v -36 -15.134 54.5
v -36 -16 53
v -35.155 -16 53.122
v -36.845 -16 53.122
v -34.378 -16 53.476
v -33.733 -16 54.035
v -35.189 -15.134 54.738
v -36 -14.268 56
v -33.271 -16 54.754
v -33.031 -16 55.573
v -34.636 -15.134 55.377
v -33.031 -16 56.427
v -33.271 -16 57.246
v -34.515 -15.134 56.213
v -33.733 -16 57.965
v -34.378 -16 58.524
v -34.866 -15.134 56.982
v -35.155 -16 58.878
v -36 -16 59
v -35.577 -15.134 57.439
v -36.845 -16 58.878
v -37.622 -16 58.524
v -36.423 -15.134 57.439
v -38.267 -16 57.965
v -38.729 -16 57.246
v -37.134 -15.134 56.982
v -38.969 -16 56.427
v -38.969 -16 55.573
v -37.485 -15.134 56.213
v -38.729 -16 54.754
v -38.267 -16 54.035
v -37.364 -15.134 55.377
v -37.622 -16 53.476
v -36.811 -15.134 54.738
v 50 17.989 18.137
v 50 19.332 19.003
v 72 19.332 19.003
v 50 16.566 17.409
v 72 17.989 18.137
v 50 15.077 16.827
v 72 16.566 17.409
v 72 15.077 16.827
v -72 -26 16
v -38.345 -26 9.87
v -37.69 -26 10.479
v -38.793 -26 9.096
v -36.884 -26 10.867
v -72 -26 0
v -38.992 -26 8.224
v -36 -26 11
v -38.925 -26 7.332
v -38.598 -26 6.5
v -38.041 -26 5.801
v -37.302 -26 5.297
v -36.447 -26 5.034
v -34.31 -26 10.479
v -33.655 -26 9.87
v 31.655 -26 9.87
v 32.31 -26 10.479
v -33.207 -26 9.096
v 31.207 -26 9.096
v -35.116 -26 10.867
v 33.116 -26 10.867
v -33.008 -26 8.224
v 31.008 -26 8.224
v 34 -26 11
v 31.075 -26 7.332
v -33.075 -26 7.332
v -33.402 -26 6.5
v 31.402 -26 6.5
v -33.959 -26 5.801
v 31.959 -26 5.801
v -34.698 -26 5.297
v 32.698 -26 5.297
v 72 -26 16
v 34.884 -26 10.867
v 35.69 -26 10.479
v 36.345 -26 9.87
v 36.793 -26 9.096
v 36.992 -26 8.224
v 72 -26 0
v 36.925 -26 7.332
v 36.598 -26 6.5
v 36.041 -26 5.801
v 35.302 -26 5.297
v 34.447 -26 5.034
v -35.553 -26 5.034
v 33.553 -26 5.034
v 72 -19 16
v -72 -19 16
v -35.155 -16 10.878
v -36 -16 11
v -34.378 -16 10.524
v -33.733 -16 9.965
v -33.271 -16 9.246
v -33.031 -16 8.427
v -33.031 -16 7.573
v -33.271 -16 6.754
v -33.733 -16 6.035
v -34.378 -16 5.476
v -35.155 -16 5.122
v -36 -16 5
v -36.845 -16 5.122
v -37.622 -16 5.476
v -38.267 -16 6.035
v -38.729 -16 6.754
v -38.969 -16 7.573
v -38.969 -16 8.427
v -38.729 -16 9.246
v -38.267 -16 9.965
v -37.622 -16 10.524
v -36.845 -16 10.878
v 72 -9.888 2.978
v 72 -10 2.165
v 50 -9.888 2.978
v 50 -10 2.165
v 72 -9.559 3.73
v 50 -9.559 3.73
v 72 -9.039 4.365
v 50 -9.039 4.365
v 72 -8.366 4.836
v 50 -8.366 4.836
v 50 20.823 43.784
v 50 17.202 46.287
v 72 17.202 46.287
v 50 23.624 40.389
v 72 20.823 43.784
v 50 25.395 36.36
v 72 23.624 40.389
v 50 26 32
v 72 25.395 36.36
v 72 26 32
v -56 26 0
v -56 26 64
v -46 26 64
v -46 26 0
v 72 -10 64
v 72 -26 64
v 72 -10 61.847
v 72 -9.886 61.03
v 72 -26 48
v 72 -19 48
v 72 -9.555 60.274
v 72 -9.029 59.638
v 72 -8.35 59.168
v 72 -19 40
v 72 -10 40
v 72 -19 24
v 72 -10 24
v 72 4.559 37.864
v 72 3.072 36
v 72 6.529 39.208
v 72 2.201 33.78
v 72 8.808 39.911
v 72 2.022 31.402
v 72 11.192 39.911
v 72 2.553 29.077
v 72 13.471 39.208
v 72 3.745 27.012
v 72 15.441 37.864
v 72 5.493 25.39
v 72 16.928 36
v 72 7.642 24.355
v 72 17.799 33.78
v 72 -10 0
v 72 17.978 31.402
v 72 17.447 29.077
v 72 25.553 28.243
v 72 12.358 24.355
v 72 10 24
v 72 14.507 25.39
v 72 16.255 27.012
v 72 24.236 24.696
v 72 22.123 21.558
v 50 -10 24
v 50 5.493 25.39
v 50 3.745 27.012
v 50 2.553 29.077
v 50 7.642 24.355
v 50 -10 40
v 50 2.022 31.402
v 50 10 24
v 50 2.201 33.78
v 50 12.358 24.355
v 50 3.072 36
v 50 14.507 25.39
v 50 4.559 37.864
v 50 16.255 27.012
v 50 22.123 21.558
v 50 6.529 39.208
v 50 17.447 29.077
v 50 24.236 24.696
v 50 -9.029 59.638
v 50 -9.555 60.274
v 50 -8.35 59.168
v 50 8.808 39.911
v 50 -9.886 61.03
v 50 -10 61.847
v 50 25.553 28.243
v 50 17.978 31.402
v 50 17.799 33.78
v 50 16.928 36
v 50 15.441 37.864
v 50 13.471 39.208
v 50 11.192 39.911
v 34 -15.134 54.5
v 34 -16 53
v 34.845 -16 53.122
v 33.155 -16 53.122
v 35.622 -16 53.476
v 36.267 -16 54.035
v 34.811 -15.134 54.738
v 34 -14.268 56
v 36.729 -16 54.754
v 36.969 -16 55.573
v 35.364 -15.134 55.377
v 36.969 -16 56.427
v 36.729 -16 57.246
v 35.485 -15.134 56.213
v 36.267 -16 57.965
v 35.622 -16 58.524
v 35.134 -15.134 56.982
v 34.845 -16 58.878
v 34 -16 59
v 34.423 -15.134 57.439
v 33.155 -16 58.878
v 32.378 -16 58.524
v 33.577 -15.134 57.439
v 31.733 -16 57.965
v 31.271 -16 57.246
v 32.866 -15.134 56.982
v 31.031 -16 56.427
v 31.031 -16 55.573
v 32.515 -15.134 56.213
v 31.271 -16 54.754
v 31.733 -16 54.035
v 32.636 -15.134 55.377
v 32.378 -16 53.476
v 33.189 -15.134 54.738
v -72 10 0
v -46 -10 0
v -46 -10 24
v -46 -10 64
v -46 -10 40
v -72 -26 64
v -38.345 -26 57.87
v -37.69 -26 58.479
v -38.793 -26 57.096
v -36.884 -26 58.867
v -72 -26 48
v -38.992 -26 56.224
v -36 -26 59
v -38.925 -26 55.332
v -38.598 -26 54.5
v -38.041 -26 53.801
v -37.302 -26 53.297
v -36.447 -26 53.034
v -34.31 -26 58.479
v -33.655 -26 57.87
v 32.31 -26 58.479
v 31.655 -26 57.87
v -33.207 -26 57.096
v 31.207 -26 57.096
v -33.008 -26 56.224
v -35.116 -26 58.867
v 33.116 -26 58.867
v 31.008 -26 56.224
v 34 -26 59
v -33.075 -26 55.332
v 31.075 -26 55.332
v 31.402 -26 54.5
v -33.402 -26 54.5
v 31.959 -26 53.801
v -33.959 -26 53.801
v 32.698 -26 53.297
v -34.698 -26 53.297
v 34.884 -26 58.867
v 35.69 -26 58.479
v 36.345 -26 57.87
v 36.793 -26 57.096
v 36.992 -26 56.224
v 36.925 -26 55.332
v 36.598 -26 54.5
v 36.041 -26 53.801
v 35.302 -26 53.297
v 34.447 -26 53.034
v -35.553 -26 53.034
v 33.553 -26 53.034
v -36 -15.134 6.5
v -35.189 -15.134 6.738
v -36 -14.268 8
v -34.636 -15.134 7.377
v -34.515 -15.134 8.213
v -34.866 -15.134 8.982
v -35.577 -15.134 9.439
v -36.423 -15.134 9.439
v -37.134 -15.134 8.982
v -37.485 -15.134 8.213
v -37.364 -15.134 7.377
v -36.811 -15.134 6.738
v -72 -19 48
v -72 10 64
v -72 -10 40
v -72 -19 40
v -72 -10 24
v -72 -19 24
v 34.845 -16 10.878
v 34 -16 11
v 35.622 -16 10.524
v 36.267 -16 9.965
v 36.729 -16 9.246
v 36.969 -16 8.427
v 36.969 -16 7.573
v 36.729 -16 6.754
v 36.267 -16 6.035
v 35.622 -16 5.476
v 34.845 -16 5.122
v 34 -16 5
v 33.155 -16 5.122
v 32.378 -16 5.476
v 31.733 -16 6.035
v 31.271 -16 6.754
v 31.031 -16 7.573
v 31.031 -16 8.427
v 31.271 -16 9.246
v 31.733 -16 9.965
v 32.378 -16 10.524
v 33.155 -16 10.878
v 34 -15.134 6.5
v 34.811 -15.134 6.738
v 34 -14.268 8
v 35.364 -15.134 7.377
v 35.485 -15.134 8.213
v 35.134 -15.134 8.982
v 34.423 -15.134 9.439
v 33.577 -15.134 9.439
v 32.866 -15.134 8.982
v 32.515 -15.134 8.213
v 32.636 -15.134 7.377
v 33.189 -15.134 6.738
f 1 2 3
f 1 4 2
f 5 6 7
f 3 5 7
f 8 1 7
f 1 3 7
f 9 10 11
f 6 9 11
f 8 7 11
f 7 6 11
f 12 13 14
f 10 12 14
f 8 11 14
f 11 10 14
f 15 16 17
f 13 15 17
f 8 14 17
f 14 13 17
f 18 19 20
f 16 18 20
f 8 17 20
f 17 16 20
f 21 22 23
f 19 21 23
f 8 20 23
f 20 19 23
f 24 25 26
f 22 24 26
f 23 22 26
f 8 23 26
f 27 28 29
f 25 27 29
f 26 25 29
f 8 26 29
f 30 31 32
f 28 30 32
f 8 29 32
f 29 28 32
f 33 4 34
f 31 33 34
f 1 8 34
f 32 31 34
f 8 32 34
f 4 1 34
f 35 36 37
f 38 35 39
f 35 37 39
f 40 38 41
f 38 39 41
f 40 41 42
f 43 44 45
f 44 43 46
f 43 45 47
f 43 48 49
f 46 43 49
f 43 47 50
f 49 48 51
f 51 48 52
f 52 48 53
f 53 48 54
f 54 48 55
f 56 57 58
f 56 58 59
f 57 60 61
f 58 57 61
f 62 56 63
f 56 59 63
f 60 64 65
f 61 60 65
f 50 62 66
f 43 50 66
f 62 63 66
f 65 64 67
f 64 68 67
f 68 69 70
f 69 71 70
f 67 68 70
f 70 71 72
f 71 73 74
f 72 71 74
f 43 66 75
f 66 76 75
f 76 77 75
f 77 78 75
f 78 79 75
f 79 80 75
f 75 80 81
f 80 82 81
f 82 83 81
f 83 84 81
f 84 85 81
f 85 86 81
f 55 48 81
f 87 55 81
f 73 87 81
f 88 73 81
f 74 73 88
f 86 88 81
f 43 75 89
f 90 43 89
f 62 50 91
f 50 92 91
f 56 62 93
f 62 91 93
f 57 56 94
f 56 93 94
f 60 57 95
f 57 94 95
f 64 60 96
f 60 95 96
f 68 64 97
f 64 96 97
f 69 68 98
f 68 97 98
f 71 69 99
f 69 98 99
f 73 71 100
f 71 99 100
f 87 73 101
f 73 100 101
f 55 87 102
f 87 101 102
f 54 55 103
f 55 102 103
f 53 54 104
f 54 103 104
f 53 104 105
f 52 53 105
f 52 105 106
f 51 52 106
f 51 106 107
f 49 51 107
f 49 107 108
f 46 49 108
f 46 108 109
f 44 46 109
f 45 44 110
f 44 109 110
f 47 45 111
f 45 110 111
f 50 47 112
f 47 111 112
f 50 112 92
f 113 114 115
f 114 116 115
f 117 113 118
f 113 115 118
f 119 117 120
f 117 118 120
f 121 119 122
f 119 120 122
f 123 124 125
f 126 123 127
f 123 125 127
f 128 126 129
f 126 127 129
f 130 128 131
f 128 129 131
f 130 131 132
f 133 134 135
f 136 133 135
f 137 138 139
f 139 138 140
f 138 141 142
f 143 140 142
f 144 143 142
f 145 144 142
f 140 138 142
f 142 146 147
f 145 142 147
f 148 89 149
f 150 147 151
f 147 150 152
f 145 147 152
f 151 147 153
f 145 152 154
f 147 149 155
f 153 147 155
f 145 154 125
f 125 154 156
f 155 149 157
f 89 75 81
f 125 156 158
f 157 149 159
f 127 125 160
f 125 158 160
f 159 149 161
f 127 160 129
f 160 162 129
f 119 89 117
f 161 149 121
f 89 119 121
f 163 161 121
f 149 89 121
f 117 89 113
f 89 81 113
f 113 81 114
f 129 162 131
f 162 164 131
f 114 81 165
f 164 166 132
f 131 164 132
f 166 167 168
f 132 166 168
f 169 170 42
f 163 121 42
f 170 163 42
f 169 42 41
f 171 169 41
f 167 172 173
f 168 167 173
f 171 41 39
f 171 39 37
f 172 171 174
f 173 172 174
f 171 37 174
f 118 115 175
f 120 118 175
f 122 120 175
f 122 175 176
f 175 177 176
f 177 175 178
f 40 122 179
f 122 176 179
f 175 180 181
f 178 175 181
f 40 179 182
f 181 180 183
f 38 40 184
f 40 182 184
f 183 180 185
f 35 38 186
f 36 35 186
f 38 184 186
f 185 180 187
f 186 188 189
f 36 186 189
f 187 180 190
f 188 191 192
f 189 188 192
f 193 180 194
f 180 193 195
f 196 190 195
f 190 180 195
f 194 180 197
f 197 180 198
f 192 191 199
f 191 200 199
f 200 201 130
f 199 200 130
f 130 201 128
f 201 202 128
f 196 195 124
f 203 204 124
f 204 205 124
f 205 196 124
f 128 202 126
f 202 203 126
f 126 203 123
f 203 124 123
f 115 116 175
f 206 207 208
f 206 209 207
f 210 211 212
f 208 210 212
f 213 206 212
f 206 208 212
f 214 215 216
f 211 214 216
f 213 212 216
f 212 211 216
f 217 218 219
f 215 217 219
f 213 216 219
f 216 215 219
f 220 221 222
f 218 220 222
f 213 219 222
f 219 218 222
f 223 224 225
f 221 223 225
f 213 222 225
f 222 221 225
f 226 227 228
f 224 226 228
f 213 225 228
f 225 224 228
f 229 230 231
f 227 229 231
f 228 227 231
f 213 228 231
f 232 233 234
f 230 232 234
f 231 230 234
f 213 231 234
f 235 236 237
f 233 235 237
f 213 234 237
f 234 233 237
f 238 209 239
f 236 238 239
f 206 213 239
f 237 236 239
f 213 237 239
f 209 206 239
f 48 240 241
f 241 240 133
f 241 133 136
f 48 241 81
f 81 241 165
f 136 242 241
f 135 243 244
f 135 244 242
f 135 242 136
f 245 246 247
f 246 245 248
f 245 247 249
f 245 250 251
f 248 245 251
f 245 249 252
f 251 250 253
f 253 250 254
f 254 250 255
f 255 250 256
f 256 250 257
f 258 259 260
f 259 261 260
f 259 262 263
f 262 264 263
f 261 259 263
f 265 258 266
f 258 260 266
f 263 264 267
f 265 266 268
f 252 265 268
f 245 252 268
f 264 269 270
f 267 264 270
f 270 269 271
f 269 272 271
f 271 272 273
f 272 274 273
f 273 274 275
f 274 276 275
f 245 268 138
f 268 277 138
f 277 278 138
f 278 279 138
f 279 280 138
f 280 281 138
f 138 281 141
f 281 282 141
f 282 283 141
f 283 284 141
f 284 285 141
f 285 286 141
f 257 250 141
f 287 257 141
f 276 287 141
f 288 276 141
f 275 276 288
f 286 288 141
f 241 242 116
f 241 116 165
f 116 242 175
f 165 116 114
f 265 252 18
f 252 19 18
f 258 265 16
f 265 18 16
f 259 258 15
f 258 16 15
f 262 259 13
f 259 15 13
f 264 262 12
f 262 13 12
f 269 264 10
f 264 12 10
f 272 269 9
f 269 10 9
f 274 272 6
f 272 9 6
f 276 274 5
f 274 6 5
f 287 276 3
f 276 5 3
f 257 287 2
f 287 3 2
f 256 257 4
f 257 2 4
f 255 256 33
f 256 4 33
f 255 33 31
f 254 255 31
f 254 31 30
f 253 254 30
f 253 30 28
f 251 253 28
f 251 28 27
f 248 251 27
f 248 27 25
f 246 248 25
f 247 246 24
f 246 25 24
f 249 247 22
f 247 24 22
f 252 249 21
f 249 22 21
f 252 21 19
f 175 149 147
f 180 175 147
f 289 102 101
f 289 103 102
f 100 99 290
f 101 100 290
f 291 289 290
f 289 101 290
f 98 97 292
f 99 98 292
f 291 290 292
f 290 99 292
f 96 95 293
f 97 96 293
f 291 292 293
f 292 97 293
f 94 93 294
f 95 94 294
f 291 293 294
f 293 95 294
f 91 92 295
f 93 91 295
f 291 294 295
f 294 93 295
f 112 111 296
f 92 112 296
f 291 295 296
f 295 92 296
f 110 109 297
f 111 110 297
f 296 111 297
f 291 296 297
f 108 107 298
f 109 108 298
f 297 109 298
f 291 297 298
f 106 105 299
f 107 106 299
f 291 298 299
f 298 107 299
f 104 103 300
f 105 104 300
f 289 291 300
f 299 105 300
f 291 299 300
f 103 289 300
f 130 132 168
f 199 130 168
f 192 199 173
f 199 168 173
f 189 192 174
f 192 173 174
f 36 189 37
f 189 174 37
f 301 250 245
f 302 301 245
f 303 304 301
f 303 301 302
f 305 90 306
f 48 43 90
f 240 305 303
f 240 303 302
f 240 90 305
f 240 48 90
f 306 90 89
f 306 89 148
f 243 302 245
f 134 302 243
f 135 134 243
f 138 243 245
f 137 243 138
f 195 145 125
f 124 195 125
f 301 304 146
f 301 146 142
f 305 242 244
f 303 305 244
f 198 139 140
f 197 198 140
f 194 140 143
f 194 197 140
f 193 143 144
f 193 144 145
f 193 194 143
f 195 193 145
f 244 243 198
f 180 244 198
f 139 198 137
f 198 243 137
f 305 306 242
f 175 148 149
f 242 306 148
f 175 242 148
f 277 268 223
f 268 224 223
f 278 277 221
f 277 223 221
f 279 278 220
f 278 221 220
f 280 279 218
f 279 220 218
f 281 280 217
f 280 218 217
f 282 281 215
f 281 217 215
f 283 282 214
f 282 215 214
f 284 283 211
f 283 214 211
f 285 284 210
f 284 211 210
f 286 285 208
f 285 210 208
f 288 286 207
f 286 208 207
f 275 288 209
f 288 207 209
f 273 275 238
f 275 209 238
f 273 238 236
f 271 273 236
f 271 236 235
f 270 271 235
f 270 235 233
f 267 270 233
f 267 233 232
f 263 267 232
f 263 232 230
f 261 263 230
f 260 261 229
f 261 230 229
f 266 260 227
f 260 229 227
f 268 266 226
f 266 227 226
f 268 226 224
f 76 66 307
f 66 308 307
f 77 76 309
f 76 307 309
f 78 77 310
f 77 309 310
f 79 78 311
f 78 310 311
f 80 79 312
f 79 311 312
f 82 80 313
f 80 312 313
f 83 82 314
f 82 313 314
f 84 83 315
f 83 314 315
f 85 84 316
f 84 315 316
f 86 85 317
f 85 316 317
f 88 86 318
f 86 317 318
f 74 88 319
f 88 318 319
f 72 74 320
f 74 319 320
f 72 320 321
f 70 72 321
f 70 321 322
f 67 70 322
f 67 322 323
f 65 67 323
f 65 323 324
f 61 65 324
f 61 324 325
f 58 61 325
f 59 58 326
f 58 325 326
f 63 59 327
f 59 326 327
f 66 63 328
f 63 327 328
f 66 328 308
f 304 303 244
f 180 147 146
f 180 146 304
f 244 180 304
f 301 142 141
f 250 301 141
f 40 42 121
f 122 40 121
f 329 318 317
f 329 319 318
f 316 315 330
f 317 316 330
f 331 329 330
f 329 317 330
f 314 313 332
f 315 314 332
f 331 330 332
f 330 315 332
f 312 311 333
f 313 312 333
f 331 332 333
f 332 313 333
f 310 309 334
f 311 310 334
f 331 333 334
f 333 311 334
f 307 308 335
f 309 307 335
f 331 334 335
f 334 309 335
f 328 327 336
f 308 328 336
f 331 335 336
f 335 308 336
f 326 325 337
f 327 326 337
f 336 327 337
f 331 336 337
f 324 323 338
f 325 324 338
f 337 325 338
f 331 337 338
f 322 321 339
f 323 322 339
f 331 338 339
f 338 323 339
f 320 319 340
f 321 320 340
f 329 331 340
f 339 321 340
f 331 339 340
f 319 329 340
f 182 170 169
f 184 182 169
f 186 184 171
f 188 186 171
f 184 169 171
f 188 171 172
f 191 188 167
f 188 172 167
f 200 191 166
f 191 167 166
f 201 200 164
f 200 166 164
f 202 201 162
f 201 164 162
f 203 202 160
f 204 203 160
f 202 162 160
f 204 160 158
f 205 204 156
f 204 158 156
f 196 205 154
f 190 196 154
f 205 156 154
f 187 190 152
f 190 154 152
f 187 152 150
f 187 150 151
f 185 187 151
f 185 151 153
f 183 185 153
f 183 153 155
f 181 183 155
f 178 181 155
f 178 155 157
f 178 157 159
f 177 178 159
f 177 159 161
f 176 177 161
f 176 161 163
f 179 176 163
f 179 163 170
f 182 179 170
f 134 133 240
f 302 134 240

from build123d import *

# Parameters (mm, degrees)
SKETCH2_W                 = 144
SKETCH2_H                 = 52
BOSS_EXTRUDE2_DEPTH       = 64
SKETCH3_W                 = 96
SKETCH3_H                 = 36
CUT_EXTRUDE1_DEPTH        = 64
SKETCH6_R                 = 8
CUT_EXTRUDE5_DEPTH        = 64
CUT_EXTRUDE7_DEPTH        = 160.712241234
CUT_EXTRUDE8_DEPTH        = 100.779757466
FILLET1_R                 = 3
F_1_0MM_DOWEL_HOLE1_D     = 6
F_1_0MM_DOWEL_HOLE1_DEPTH = 10
F_1_0MM_DOWEL_HOLE1_TIP   = 1.732050808
F_1_0MM_DOWEL_HOLE2_D     = 6
F_1_0MM_DOWEL_HOLE2_DEPTH = 10
F_1_0MM_DOWEL_HOLE2_TIP   = 1.732050808


with BuildPart() as part:
    # Sketch2 → Boss-Extrude2 (new body)
    with BuildSketch(Plane.XY):
        Rectangle(SKETCH2_W, SKETCH2_H)
    extrude(amount=BOSS_EXTRUDE2_DEPTH)

    # Sketch3 → Cut-Extrude1 (cut)
    with BuildSketch(Plane.XY.offset(64)):
        with Locations((2, 8)):
            Rectangle(SKETCH3_W, SKETCH3_H)
    extrude(amount=-CUT_EXTRUDE1_DEPTH, mode=Mode.SUBTRACT)

    # Sketch6 → Cut-Extrude5 (cut)
    with BuildSketch(Plane(origin=(72, 0, 0), x_dir=(0, 0, -1), z_dir=(1, 0, 0))):
        Polygon((-64, 26), (-64, -10), (-60, -10), (-46.287322277, 17.202251187), (-41.852369694, 26), align=None)
        with BuildLine():
            Line((0, 26), (-22.4139537, 26))
            Line((-22.4139537, 26), (-19.003189987, 19.331823481))
            ThreePointArc((-19.003189987, 19.331823481), (-17.755283243, 17.286154301), (-16.826882915, 15.077058))
            Line((-16.826882915, 15.077058), (-4, -10))
            Line((-4, -10), (0, -10))
            Line((0, -10), (0, 26))
        make_face()
        with BuildLine():
            Line((-22.4139537, 26), (-32, 26))
            ThreePointArc((-32, 26), (-24.696205633, 24.235680098), (-19.003189987, 19.331823481))
            Line((-19.003189987, 19.331823481), (-22.4139537, 26))
        make_face()
        with BuildLine():
            Line((-41.852369694, 26), (-46.287322277, 17.202251187))
            ThreePointArc((-46.287322277, 17.202251187), (-40.389397505, 23.624170048), (-32, 26))
            Line((-32, 26), (-41.852369694, 26))
        make_face()
        with Locations((-32, 10)):
            Circle(SKETCH6_R)
    extrude(amount=-CUT_EXTRUDE5_DEPTH, mode=Mode.SUBTRACT)

    # Sketch7 → Cut-Extrude7 (cut, through all)
    with BuildSketch(Plane(origin=(72, 0, 0), x_dir=(0, 0, -1), z_dir=(1, 0, 0))):
        Polygon((-40, -10), (-40, -19), (-32, -19), (-24, -19), (-24, -10), align=None)
        Polygon((-48, -19), (-48, -26), (-16, -26), (-16, -19), (-24, -19), (-32, -19), (-40, -19), align=None)
    extrude(amount=-CUT_EXTRUDE7_DEPTH, mode=Mode.SUBTRACT)

    # Sketch8 → Cut-Extrude8 (cut, through all)
    with BuildSketch(Plane.XY.offset(64)):
        Polygon((-72, 26), (-56, 26), (-72, 10), align=None)
    extrude(amount=-CUT_EXTRUDE8_DEPTH, mode=Mode.SUBTRACT)

    # Fillet1
    fillet1_edges = [part.edges().sort_by_distance(p)[0] for p in [
        (61, -10, 4),
        (61, -10, 60),
    ]]
    fillet(fillet1_edges, radius=FILLET1_R)

    # Ø1.0mm Dowel Hole1
    with Locations(Plane(origin=(-36, -26, 56), x_dir=(0, 0, -1), z_dir=(0, -1, 0))):
        with Locations((0, 0), (0, 70)):
            Hole(F_1_0MM_DOWEL_HOLE1_D / 2, depth=F_1_0MM_DOWEL_HOLE1_DEPTH)
            with Locations((0, 0, -(F_1_0MM_DOWEL_HOLE1_DEPTH + F_1_0MM_DOWEL_HOLE1_TIP / 2))):  # 120° drill point
                Cone(0, F_1_0MM_DOWEL_HOLE1_D / 2, F_1_0MM_DOWEL_HOLE1_TIP, mode=Mode.SUBTRACT)

    # Ø1.0mm Dowel Hole2
    with Locations(Plane(origin=(-36, -26, 8), x_dir=(0, 0, -1), z_dir=(0, -1, 0))):
        with Locations((0, 0), (0, 70)):
            Hole(F_1_0MM_DOWEL_HOLE2_D / 2, depth=F_1_0MM_DOWEL_HOLE2_DEPTH)
            with Locations((0, 0, -(F_1_0MM_DOWEL_HOLE2_DEPTH + F_1_0MM_DOWEL_HOLE2_TIP / 2))):  # 120° drill point
                Cone(0, F_1_0MM_DOWEL_HOLE2_D / 2, F_1_0MM_DOWEL_HOLE2_TIP, mode=Mode.SUBTRACT)


solid = part.part
